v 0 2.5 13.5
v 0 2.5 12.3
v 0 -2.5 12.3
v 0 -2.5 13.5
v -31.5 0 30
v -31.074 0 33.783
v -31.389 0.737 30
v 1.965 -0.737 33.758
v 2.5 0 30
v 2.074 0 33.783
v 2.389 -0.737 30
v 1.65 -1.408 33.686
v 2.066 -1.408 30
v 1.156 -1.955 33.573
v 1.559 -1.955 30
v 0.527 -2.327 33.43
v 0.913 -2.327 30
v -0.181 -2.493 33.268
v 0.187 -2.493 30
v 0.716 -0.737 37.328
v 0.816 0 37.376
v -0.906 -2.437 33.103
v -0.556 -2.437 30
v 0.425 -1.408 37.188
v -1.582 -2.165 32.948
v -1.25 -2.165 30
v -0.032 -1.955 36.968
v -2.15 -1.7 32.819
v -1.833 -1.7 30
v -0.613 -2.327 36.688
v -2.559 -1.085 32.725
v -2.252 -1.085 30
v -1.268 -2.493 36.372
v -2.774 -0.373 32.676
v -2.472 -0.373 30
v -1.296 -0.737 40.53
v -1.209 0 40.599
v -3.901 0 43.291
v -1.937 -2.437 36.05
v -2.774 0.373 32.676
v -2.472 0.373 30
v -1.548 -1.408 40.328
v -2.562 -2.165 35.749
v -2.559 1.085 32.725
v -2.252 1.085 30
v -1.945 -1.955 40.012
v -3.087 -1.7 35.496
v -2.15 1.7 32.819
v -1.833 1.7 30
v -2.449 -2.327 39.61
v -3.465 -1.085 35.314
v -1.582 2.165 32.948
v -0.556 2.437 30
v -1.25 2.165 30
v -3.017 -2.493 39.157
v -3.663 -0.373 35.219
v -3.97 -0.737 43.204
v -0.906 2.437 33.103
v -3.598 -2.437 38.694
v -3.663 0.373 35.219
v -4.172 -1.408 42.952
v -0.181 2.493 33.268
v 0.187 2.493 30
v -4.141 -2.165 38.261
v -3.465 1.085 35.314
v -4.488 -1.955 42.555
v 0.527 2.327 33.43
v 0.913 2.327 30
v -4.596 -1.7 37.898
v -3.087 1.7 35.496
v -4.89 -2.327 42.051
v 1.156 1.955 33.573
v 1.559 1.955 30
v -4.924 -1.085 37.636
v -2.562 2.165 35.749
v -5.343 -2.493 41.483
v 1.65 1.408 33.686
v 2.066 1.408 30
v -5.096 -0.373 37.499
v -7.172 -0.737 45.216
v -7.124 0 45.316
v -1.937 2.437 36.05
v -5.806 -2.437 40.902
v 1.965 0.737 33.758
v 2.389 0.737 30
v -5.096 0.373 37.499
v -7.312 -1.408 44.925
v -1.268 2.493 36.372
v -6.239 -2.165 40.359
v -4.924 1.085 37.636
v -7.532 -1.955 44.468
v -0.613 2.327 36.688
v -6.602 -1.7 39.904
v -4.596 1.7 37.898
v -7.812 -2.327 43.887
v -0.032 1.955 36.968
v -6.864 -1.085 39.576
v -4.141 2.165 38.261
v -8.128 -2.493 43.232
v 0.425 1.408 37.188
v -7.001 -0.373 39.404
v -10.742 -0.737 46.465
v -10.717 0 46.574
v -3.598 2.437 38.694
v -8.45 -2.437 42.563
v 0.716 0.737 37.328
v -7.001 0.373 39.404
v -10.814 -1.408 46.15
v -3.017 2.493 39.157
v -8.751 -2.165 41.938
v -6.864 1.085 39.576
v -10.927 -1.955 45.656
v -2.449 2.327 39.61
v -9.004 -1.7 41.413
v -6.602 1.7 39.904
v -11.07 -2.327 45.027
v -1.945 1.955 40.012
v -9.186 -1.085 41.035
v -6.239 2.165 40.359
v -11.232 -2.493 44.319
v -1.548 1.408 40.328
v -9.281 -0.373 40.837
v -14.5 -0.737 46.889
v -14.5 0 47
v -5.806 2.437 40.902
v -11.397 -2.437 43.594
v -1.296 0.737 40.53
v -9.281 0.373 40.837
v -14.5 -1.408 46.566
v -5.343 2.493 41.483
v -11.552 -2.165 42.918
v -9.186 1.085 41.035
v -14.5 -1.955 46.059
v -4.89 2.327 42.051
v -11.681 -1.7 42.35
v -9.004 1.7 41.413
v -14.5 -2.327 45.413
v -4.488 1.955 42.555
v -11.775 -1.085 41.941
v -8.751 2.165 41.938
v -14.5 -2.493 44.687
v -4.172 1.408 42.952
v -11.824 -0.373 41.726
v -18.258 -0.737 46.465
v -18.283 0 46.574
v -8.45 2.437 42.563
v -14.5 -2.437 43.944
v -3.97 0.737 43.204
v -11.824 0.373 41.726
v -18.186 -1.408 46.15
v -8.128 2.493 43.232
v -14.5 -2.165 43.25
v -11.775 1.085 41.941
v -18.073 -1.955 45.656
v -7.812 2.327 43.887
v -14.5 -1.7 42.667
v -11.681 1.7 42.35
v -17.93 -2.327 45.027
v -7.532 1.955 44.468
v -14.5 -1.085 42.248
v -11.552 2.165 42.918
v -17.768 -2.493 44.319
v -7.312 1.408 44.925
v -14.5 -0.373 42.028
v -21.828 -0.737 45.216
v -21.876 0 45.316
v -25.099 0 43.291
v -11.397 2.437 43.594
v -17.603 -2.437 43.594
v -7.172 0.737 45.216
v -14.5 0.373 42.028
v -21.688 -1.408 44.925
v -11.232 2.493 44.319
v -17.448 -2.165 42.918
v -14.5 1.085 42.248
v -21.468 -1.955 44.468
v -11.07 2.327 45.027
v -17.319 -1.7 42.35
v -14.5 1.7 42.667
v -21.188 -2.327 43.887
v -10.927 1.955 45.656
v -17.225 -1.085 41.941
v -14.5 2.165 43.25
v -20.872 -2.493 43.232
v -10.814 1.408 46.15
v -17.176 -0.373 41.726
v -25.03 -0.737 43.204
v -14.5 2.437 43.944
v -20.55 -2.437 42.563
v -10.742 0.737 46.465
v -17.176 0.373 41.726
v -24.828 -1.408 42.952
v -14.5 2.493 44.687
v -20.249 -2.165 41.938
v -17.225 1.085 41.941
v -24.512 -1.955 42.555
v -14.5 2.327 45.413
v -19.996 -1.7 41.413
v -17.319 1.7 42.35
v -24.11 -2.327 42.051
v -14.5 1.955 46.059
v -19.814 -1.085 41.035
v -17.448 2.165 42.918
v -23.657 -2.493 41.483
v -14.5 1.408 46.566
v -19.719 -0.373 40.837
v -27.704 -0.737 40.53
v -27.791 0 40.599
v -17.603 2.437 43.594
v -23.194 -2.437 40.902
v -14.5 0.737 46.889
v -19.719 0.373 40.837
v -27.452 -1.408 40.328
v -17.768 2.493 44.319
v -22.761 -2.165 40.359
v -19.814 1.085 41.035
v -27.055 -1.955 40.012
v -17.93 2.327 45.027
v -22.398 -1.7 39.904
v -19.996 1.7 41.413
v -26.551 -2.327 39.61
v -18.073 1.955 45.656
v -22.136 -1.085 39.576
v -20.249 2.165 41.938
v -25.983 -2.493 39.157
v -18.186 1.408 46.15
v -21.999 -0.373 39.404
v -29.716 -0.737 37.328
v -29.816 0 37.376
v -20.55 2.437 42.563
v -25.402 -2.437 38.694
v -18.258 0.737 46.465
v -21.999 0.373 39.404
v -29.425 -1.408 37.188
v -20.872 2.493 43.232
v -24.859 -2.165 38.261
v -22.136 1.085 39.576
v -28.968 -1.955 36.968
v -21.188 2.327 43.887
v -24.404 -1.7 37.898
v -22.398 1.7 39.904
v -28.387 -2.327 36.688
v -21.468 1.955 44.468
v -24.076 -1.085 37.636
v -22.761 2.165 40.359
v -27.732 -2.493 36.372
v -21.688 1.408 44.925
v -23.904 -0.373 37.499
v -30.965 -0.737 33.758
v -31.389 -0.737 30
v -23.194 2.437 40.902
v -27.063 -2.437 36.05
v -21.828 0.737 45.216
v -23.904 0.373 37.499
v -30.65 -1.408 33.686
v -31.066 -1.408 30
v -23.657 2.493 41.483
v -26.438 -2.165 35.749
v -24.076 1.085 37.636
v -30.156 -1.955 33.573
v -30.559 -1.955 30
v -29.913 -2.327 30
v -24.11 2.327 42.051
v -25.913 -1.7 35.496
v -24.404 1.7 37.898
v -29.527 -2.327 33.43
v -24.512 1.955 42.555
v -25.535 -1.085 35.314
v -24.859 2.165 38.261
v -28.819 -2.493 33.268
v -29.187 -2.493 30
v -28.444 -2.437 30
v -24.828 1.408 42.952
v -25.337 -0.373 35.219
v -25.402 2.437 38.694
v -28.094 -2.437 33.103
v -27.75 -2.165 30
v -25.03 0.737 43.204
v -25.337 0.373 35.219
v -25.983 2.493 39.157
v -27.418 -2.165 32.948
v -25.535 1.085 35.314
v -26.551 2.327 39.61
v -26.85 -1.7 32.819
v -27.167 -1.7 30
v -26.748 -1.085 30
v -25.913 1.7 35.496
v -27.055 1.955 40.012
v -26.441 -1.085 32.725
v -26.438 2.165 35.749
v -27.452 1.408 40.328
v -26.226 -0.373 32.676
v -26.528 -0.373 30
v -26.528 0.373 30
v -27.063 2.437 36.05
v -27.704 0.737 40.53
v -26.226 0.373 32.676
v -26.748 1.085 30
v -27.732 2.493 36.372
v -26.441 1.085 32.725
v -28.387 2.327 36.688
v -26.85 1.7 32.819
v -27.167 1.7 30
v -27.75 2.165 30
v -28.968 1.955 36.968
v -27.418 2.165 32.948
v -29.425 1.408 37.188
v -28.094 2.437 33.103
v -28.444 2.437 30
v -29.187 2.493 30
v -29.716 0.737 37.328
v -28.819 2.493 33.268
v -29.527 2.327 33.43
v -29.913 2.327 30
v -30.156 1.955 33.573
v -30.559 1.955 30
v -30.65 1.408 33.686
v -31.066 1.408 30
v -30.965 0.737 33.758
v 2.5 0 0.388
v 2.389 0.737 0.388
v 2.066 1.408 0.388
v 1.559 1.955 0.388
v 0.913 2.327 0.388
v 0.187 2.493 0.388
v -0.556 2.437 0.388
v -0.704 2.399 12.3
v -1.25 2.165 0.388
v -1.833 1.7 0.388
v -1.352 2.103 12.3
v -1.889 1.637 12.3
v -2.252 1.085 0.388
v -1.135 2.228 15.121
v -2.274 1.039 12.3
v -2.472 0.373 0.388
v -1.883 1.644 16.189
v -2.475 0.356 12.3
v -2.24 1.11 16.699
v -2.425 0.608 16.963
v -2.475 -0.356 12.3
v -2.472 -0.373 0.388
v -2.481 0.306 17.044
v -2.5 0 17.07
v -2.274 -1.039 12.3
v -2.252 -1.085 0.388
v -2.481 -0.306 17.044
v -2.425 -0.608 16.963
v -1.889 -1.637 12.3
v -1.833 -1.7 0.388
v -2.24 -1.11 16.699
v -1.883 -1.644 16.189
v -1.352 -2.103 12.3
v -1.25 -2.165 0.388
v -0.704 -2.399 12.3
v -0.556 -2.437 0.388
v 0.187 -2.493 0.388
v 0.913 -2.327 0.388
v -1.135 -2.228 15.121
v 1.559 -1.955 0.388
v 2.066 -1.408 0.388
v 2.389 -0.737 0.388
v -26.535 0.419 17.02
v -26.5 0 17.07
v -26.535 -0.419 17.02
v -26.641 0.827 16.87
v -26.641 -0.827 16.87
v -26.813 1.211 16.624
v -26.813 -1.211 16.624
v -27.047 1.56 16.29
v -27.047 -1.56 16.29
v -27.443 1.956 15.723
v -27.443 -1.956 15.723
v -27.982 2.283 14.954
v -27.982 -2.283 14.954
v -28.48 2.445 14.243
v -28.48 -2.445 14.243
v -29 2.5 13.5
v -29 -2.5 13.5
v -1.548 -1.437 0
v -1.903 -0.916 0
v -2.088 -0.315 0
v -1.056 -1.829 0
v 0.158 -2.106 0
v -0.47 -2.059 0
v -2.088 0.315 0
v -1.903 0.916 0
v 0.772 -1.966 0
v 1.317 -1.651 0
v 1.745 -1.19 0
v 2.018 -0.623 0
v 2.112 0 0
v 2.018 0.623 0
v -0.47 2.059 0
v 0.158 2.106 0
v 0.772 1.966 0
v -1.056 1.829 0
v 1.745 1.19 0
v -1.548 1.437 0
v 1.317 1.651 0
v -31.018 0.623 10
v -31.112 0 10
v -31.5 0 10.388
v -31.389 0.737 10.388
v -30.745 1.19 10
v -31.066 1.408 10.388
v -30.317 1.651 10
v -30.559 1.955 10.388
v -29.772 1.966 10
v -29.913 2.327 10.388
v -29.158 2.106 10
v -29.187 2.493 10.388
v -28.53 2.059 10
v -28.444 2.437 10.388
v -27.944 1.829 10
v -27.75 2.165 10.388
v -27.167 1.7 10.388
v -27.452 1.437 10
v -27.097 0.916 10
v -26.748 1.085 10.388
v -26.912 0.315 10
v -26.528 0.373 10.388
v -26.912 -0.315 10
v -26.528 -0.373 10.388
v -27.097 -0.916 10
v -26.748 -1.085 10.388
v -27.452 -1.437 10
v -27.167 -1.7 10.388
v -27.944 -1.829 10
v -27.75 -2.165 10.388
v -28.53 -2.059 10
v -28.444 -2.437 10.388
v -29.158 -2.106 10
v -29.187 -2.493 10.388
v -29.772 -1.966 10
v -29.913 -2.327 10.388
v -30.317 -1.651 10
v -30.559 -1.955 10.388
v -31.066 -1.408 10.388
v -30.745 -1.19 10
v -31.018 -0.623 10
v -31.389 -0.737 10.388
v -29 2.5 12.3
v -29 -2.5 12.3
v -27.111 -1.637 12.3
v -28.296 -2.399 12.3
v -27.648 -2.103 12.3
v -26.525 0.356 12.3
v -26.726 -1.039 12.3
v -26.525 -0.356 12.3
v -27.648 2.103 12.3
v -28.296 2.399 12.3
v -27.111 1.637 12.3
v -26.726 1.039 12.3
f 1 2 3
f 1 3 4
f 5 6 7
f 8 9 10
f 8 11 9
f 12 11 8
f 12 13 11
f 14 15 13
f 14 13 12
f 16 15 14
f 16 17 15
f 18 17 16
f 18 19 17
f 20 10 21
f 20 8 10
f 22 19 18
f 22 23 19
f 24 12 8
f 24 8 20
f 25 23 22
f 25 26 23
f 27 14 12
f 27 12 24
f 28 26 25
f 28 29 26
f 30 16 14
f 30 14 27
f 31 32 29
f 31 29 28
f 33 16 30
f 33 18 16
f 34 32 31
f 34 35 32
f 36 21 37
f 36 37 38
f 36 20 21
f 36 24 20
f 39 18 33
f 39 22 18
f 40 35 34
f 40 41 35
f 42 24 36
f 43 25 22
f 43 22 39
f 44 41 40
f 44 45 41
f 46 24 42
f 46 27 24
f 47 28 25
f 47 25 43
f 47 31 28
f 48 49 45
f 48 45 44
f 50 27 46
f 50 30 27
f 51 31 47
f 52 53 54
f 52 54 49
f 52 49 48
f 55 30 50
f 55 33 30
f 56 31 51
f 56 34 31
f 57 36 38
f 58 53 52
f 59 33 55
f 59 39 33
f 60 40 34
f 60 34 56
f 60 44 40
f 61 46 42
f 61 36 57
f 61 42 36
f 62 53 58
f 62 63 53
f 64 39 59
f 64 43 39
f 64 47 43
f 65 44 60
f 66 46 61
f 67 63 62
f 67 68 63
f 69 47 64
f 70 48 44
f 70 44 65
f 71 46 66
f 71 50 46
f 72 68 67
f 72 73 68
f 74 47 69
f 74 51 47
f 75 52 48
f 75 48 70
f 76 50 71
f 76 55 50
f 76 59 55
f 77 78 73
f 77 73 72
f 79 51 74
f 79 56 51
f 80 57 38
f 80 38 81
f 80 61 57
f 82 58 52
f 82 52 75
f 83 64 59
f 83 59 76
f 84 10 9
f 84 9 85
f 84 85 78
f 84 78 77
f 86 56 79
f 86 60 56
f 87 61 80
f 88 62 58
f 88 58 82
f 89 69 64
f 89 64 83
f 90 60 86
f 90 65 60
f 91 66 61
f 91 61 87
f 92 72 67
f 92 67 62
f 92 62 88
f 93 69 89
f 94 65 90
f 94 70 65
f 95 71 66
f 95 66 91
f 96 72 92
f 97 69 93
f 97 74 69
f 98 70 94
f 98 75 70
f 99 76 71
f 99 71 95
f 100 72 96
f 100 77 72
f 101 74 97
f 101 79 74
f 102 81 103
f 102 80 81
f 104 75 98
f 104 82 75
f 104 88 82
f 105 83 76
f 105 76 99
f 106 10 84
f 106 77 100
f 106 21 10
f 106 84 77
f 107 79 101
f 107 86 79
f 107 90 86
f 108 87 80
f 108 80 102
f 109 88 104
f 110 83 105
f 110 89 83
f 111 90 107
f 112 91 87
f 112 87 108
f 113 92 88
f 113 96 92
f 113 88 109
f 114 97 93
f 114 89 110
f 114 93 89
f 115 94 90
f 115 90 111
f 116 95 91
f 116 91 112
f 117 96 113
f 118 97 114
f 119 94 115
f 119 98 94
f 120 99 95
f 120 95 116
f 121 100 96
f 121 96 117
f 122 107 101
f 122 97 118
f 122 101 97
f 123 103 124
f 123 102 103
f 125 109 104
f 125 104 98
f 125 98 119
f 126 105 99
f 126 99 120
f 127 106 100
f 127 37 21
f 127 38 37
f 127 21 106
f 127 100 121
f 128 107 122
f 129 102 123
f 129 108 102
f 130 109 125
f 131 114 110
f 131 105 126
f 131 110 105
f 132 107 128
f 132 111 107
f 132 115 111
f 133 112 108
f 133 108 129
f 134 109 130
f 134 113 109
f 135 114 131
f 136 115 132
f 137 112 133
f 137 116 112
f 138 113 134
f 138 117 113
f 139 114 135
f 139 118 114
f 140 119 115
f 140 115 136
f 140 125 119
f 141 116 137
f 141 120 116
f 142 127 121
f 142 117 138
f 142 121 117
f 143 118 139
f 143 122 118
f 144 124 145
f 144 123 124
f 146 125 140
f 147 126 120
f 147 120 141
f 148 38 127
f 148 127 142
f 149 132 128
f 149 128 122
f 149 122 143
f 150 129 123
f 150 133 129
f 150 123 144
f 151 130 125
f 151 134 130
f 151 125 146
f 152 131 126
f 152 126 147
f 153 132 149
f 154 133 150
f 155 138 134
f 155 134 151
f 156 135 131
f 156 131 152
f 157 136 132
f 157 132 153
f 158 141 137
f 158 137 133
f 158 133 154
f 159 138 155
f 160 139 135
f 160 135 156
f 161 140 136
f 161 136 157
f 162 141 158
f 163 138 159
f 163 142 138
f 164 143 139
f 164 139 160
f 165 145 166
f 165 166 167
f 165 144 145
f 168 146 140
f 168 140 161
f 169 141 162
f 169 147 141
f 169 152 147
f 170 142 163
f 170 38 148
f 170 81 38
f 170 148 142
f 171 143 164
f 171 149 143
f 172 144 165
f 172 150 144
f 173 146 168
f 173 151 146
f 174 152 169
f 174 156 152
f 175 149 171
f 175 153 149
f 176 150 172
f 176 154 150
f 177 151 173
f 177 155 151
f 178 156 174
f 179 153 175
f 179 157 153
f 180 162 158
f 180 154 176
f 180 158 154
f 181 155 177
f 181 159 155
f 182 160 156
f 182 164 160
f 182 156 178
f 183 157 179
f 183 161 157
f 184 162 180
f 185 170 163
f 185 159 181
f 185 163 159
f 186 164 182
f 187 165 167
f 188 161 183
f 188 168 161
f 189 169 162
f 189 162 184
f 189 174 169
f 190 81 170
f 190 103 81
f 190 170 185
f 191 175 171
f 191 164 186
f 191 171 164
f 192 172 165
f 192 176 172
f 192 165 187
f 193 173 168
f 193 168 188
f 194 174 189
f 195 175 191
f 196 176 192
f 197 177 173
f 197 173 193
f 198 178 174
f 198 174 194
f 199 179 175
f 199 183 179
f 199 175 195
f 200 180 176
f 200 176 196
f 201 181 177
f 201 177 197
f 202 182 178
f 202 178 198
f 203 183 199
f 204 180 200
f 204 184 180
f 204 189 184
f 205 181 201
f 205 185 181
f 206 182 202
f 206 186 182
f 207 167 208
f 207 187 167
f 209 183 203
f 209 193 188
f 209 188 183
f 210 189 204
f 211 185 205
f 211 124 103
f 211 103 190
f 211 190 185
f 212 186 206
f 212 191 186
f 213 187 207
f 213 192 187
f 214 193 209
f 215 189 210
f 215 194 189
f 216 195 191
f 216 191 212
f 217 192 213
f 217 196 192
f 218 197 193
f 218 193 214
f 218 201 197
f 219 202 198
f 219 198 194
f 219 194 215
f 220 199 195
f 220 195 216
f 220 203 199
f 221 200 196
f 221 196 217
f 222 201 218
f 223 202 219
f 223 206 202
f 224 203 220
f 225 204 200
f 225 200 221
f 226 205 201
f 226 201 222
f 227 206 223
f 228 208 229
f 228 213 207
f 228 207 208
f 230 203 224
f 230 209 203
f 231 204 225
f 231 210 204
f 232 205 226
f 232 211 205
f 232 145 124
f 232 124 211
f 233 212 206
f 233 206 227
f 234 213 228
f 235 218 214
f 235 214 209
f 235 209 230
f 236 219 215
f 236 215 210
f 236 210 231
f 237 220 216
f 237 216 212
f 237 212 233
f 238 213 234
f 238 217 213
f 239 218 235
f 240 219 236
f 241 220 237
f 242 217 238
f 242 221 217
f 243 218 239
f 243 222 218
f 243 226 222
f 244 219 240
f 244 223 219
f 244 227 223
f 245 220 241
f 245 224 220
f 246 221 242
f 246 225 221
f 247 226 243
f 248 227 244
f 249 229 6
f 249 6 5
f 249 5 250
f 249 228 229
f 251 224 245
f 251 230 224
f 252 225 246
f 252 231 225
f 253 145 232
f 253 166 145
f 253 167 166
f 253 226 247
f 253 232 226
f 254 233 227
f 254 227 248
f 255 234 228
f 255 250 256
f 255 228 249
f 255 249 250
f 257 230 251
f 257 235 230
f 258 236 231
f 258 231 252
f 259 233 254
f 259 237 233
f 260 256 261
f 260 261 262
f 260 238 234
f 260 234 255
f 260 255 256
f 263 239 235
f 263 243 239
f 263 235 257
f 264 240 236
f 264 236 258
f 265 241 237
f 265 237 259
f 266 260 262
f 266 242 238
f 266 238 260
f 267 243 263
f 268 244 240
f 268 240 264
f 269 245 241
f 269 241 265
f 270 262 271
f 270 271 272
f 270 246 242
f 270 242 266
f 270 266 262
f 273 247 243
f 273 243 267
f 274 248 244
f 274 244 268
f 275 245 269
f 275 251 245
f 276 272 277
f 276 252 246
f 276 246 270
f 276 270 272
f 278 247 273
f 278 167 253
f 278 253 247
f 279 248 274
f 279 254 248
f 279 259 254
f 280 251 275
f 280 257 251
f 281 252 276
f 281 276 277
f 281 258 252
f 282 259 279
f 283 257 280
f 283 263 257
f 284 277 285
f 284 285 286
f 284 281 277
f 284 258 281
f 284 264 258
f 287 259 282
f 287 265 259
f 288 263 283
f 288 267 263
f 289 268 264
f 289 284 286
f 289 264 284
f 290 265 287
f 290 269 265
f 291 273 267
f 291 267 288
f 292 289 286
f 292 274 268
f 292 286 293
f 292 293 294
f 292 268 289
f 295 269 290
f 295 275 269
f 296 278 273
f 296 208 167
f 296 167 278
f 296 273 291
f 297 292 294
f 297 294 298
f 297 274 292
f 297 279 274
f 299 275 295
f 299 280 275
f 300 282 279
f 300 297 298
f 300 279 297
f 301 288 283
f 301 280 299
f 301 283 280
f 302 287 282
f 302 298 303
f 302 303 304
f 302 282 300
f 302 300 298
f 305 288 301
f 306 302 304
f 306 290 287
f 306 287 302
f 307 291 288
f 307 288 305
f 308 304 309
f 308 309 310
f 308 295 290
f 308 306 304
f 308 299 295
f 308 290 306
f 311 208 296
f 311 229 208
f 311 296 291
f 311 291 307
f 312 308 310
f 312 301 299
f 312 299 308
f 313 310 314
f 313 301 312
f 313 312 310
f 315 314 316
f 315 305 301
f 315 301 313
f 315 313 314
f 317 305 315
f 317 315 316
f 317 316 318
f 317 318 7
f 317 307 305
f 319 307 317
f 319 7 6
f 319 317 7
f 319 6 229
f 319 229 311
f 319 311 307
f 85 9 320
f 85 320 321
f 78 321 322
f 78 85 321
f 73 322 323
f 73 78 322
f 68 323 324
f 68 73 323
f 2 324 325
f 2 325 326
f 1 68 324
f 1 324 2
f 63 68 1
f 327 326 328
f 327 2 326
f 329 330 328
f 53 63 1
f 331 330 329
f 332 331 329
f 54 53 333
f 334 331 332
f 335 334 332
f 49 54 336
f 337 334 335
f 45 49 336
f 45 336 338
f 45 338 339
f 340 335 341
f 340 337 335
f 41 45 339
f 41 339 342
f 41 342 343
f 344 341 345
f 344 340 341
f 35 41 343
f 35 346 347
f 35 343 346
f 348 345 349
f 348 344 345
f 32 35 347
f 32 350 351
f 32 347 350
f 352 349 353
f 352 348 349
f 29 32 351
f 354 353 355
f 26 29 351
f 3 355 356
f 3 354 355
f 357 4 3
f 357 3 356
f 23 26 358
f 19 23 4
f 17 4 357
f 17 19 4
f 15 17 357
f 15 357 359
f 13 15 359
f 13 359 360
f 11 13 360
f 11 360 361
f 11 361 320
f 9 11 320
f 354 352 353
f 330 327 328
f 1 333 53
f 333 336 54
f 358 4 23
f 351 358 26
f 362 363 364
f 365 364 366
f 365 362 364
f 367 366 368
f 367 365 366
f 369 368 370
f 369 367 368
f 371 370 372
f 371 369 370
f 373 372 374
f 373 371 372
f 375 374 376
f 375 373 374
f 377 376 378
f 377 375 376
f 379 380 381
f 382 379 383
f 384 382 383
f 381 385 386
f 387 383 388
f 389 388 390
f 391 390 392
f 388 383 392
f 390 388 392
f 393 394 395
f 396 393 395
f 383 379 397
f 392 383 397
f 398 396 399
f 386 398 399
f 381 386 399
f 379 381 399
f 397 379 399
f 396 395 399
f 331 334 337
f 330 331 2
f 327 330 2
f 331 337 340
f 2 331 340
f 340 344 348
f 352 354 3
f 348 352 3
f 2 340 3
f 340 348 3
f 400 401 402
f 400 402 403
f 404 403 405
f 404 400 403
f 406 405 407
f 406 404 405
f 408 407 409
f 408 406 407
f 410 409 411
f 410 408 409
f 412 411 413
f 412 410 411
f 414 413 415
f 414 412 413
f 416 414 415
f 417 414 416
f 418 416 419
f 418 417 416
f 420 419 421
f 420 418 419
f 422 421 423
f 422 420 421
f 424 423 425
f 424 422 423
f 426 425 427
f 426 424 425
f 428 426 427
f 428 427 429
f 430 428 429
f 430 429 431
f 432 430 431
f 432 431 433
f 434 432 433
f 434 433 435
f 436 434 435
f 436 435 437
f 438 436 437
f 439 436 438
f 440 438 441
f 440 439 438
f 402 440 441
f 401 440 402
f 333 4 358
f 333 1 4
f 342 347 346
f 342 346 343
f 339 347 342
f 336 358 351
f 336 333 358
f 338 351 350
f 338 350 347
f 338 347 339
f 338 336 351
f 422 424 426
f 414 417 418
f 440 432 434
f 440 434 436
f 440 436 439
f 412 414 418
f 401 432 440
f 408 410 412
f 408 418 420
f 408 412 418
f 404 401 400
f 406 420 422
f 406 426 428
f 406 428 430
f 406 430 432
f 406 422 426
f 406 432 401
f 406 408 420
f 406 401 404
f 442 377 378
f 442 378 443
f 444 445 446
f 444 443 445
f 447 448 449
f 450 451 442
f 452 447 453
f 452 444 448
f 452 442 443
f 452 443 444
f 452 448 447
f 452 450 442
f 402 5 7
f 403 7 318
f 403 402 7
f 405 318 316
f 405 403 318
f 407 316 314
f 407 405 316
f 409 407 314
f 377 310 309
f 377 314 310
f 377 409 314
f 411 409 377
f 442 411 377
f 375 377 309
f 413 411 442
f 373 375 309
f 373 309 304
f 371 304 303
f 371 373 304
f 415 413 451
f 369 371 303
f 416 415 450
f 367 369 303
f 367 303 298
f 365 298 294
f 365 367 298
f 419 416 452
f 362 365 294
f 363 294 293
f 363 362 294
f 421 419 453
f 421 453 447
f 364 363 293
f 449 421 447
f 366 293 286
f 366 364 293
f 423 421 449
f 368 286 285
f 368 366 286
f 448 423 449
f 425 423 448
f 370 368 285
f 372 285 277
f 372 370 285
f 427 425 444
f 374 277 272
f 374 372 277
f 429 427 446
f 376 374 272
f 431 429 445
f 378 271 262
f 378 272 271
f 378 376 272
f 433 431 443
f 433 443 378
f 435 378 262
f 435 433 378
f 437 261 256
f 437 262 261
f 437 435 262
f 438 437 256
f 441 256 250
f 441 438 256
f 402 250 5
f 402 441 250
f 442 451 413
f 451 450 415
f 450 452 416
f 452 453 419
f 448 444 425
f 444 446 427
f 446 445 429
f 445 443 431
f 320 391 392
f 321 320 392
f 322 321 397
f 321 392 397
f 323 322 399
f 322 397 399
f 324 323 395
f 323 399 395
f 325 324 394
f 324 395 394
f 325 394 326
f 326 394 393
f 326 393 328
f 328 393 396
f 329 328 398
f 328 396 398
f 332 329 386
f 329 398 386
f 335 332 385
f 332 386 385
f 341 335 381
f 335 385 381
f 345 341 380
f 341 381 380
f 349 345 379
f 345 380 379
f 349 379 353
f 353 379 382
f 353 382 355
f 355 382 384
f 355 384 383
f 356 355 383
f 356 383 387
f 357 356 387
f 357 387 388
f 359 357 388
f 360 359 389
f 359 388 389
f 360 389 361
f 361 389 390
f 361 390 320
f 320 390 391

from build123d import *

# Parameters (mm, degrees)
F0_R          = 2.5
F4_DEPTH      = 2.5010001
F4_DEPTH_BACK = 2.5010001
F5_SIZE       = 0.388


with BuildPart() as f2:
    # F2: sweep along a path in F1
    with BuildLine(Plane.XZ) as f2_path:
        Line((0, 0), (0, 30))
        ThreePointArc((0, 30), (-14.5, 44.5), (-29, 30))
        Line((-29, 30), (-29, 10))
    # F0 (on Top) → F2 (sweep)
    with BuildSketch(Plane.XY):
        Circle(F0_R)
    sweep(path=f2_path.line)

    # F3 (on Front) → F4 (cut, two sides)
    with BuildSketch(Plane.XZ) as f4_sk:
        Polygon((-29, 13.5), (-29, 12.3), (-24.9849649455, 12.3), (-24.9849649455, 19.23406431), align=None)
        Polygon((-4.0150350545, 19.23406431), (-4.0150350545, 12.3), (0, 12.3), (0, 13.5), align=None)
    extrude(amount=-F4_DEPTH, mode=Mode.SUBTRACT)
    extrude(f4_sk.sketch, amount=F4_DEPTH_BACK, mode=Mode.SUBTRACT)

    # F5
    f5_edges = [f2.edges().sort_by_distance(p)[0] for p in [
        (-26.5, 0, 10),
        (-2.5, 0, 0),
    ]]
    chamfer(f5_edges, length=F5_SIZE)


solid = f2.part
